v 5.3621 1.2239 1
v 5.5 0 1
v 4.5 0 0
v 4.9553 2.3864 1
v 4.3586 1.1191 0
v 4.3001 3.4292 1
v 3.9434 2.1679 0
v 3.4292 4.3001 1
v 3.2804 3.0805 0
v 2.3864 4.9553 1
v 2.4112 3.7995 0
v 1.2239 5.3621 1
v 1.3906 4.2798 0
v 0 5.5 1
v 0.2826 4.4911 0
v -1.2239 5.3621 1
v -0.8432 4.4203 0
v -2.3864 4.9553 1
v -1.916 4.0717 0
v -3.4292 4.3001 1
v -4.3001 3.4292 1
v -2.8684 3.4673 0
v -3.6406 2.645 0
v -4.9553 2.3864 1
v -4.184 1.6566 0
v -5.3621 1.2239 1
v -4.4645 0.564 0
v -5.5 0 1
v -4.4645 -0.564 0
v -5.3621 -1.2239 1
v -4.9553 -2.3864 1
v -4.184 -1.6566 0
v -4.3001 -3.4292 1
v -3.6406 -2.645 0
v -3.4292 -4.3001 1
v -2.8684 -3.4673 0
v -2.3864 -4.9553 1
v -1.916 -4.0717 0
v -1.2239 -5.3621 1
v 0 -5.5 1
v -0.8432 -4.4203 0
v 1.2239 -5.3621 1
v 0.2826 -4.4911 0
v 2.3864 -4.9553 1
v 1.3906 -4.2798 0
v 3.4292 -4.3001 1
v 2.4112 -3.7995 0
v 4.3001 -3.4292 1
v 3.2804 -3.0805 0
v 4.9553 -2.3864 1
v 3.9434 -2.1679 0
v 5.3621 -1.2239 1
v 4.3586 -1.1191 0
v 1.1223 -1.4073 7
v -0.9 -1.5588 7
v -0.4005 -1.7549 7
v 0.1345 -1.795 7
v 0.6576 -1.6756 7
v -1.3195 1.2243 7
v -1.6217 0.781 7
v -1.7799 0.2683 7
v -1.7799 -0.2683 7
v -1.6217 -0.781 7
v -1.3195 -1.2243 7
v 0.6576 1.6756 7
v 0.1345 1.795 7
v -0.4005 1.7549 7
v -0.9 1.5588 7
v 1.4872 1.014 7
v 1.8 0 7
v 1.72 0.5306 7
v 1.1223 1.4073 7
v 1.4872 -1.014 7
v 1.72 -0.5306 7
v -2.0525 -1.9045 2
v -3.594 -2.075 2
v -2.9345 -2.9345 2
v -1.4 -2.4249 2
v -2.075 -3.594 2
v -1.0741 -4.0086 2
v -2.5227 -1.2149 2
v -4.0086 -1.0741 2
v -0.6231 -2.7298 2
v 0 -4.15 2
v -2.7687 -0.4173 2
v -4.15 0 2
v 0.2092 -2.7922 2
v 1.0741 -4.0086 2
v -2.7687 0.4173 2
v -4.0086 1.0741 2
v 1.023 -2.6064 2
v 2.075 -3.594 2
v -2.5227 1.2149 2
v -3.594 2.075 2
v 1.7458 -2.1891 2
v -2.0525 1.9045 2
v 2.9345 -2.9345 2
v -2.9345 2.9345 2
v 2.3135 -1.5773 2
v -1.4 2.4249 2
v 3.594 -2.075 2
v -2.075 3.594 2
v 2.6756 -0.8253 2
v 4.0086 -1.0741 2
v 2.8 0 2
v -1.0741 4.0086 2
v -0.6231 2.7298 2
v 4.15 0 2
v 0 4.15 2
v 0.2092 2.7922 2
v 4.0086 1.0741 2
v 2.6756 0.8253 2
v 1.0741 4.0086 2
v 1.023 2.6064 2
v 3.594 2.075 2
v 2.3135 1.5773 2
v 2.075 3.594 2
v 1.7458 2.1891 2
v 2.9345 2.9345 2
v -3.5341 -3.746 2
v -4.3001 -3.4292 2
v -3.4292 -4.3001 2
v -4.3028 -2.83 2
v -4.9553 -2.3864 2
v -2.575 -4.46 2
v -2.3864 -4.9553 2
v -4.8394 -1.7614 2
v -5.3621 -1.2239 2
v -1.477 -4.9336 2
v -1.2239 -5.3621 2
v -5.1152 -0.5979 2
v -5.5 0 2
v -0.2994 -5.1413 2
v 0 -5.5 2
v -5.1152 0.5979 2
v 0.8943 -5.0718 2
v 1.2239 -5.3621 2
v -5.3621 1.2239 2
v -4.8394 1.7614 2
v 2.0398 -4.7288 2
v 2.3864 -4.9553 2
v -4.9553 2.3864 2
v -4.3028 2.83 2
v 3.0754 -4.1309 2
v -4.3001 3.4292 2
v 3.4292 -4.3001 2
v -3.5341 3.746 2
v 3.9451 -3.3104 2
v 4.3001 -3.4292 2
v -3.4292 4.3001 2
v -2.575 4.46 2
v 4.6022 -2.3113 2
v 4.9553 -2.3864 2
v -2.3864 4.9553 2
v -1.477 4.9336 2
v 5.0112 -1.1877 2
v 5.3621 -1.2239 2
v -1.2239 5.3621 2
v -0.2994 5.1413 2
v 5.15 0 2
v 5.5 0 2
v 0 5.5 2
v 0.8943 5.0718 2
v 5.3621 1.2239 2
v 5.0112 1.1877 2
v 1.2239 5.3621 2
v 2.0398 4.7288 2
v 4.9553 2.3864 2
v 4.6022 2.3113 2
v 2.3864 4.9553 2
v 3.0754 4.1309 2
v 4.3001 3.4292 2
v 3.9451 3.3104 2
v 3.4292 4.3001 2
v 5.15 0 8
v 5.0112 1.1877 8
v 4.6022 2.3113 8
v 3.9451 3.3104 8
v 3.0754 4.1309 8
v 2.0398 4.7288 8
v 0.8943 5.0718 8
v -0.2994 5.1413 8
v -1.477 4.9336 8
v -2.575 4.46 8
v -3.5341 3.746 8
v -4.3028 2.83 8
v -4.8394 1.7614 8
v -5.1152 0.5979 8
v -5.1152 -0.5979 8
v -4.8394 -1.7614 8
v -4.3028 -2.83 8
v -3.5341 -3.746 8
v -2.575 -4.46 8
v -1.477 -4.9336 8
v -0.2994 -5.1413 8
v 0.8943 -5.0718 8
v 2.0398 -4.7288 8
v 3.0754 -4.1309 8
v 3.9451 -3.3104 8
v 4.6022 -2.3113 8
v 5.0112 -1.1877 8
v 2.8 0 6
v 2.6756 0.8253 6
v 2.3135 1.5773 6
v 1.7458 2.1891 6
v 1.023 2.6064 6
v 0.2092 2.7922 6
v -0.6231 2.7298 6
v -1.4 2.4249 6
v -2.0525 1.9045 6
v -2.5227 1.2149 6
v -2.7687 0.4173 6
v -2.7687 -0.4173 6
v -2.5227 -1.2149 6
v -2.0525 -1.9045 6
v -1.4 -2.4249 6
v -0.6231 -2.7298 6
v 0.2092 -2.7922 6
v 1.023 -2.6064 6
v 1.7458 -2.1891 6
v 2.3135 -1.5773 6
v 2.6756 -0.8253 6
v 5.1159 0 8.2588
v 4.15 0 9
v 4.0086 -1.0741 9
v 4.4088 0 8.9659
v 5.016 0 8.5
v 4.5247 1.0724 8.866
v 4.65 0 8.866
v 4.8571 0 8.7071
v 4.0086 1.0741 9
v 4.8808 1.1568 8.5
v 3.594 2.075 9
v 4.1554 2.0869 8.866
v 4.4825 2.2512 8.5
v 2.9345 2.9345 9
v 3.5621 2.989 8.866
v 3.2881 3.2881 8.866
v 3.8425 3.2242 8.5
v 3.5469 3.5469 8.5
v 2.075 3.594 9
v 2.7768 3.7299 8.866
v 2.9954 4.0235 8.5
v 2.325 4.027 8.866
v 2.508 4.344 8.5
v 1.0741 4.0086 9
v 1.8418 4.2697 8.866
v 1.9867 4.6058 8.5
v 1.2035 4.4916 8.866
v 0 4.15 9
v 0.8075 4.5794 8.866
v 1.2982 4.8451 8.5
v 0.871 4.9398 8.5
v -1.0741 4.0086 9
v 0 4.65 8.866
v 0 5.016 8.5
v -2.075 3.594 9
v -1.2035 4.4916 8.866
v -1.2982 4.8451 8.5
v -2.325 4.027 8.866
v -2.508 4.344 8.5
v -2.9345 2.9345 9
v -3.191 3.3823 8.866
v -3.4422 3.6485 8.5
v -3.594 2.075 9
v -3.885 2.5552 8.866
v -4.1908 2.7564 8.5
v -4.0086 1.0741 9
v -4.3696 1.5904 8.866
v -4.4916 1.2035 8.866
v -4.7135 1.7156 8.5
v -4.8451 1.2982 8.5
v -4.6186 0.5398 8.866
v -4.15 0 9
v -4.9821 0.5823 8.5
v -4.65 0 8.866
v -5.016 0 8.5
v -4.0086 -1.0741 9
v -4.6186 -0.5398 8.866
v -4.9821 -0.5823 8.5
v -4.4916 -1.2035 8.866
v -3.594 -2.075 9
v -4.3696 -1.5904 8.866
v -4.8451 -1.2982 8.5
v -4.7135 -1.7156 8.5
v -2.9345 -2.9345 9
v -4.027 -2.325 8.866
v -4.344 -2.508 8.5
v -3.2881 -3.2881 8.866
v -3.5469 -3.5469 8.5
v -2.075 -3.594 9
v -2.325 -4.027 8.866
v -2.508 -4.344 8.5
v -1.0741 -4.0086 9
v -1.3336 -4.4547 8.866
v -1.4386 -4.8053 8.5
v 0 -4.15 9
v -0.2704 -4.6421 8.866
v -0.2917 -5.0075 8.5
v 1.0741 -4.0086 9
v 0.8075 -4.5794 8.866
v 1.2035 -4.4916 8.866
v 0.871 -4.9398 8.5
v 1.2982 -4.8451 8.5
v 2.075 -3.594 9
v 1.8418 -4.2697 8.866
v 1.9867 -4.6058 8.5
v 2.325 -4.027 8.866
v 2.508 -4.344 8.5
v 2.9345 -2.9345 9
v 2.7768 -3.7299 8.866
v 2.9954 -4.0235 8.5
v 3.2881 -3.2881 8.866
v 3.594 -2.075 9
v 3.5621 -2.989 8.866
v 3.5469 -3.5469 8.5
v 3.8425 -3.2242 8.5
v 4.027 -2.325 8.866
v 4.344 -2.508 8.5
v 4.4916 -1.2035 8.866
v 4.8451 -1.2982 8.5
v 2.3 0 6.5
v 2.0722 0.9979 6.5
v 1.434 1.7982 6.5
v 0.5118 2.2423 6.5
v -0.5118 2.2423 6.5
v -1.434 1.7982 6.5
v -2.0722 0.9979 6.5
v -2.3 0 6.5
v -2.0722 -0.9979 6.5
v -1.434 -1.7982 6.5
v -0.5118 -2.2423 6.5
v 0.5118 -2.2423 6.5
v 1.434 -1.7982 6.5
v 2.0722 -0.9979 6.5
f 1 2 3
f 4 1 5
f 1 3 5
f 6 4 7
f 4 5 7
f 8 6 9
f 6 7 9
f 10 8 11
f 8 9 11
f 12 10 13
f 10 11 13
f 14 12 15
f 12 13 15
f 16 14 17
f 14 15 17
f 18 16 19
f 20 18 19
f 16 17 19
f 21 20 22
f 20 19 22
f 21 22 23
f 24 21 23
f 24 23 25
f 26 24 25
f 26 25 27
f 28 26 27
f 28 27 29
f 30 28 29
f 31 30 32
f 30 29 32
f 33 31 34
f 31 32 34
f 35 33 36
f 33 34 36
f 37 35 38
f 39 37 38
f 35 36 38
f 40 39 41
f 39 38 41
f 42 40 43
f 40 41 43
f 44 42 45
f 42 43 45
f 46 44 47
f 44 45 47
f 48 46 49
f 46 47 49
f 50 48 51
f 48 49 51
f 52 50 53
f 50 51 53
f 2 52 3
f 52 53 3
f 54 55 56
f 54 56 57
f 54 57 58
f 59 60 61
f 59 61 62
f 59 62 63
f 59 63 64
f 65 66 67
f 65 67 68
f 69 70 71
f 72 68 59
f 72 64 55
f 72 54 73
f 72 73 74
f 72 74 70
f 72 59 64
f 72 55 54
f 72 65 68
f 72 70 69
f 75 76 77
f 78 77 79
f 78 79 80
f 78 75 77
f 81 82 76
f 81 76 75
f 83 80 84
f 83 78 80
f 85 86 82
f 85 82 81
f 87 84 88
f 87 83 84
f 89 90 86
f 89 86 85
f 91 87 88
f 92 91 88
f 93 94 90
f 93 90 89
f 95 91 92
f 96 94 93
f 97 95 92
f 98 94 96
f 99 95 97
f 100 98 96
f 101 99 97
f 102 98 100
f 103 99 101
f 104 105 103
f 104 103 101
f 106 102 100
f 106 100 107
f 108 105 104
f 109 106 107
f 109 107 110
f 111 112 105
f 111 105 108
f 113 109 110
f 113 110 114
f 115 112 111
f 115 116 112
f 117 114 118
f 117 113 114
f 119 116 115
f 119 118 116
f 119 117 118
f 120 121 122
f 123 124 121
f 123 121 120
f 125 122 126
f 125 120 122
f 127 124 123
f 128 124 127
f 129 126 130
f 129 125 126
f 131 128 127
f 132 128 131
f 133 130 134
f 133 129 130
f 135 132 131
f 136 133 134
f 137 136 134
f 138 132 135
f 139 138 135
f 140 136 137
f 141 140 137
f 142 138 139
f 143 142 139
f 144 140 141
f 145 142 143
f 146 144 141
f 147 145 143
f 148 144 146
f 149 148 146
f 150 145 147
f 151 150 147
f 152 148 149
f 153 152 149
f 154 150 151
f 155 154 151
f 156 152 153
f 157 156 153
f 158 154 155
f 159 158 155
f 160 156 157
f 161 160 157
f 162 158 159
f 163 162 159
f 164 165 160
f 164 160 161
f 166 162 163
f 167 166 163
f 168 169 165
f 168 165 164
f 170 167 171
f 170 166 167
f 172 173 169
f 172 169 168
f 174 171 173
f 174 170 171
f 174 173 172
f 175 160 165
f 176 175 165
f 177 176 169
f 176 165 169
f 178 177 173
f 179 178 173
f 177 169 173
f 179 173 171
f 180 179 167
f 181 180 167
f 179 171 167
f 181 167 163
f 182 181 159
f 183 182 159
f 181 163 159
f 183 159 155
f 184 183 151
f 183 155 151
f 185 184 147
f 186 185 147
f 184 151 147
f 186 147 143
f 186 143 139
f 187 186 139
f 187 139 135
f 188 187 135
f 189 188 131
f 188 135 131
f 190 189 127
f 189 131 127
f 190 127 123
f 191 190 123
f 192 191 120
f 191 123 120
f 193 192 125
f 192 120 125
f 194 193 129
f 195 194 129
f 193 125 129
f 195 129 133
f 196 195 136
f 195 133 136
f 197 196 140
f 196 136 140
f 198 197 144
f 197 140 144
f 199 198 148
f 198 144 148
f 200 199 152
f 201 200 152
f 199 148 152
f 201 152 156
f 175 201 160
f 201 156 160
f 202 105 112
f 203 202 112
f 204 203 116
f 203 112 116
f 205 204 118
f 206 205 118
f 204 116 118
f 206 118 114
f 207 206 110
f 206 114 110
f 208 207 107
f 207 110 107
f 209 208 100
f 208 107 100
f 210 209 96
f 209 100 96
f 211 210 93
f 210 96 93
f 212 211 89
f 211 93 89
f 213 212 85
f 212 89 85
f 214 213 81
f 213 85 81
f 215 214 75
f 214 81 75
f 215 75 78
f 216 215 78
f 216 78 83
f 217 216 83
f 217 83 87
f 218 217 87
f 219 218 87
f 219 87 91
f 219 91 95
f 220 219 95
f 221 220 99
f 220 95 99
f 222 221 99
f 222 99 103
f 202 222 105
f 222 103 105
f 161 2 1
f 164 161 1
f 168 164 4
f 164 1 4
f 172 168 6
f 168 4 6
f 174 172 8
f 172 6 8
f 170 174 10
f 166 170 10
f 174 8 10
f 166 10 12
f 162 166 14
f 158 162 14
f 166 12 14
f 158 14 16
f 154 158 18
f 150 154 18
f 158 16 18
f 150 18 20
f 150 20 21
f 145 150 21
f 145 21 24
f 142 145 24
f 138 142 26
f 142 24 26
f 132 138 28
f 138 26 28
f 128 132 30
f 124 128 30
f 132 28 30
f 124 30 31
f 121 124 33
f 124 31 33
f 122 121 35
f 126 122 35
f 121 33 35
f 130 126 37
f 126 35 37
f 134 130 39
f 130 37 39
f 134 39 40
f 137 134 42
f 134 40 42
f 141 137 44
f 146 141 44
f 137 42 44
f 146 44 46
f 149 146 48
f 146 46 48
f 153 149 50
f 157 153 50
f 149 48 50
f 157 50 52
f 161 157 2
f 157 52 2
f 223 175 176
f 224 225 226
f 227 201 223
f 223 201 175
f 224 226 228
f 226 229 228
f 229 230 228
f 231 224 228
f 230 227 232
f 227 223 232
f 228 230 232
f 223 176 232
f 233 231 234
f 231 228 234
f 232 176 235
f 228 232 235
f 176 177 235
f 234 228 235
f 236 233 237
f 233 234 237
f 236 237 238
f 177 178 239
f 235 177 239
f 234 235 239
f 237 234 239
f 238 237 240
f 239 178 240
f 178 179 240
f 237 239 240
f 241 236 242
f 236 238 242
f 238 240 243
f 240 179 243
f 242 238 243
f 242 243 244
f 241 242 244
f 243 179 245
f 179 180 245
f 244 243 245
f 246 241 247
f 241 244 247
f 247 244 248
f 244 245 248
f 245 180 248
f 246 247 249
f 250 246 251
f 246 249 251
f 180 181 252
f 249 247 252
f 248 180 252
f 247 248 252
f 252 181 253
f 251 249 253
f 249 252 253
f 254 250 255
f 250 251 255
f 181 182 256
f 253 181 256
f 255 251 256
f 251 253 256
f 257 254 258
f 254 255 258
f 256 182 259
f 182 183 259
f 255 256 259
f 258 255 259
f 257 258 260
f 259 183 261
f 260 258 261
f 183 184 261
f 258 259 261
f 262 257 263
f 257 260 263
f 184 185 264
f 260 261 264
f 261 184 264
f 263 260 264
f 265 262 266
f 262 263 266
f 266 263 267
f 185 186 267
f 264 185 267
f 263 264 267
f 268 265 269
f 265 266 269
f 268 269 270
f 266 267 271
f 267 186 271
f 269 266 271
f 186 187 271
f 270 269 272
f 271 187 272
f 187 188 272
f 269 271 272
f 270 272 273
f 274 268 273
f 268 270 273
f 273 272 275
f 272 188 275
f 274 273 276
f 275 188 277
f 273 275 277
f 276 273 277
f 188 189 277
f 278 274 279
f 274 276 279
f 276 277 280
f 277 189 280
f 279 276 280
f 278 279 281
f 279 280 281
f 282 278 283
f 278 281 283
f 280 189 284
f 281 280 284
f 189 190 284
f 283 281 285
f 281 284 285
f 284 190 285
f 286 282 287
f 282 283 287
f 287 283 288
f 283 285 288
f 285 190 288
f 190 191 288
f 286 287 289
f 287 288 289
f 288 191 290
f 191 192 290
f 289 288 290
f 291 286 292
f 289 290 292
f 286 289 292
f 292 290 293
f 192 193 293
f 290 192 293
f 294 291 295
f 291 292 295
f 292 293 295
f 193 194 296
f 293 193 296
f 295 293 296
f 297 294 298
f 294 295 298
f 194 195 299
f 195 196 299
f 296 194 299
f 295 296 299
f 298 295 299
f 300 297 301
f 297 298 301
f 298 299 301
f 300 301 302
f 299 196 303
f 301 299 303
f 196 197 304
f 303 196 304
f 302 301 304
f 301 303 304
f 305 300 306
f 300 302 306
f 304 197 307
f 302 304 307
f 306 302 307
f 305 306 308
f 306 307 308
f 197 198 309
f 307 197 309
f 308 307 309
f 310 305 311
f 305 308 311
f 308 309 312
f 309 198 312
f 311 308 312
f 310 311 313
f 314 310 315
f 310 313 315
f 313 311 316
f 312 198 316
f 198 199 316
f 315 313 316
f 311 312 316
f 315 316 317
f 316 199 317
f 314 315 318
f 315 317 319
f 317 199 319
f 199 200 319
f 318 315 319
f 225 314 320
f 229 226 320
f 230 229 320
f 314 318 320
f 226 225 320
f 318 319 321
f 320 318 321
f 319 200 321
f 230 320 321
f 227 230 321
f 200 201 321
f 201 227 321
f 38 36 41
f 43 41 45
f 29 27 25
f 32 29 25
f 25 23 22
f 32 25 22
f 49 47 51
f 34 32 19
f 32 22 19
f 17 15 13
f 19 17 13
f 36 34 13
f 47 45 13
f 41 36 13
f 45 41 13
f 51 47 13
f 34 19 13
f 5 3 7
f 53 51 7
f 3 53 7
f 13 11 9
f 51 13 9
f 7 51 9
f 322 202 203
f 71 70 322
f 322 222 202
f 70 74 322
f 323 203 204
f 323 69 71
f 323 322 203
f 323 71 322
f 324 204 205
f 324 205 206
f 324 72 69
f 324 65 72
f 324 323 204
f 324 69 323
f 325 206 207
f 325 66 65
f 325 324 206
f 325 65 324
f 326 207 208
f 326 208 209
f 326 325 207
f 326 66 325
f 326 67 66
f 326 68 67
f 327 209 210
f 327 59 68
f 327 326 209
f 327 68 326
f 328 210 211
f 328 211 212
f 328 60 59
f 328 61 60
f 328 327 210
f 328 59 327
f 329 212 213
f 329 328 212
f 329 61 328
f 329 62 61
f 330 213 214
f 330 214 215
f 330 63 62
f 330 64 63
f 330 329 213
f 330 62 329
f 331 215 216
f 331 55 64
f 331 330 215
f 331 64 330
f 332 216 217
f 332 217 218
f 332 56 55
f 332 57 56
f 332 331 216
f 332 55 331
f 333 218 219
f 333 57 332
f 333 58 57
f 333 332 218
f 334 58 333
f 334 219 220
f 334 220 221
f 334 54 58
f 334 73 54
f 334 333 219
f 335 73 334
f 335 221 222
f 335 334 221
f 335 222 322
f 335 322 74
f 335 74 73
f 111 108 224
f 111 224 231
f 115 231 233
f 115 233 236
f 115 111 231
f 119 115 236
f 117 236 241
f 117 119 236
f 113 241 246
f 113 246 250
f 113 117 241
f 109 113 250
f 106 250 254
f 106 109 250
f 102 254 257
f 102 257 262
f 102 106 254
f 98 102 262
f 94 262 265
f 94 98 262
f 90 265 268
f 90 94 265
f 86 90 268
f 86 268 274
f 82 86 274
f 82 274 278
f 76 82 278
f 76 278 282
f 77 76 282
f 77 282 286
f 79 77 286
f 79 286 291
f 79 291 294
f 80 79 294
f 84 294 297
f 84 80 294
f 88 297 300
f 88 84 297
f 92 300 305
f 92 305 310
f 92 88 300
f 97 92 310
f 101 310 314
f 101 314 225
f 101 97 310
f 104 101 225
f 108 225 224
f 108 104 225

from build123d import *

# Parameters (mm, degrees)
F0_R     = 5.5
F1_DEPTH = 2
F2_R     = 2.8
F3_DEPTH = 5
F2_R_2   = 5.15
F2_R_3   = 4.15
F4_DEPTH = 7
F5_SIZE2 = 1
F5_SIZE  = 1
F6_R     = 0.99999
F7_SIZE  = 1


# Not quite as in the source:
# - a fillet or chamfer is up to 0.001 mm smaller than in the source, because OpenCascade refuses the exact size


with BuildPart() as f1:
    # F0 (on Top) → F1 (new body)
    with BuildSketch(Plane.XY):
        Circle(F0_R)
    extrude(amount=F1_DEPTH)

    # F2 (on face) → F3 (join)
    with BuildSketch(Plane.XY.offset(2)):
        Circle(F2_R)
    extrude(amount=F3_DEPTH)

    # F2 (on face) → F4 (join)
    with BuildSketch(Plane.XY.offset(2)):
        Circle(F2_R_2)
        Circle(F2_R_3, mode=Mode.SUBTRACT)
    extrude(amount=F4_DEPTH)

    # F5
    f5_edges = [f1.edges().sort_by_distance(p)[0] for p in [
        (-2.8, 0, 7),
    ]]
    chamfer(f5_edges, length=F5_SIZE, length2=F5_SIZE2)

    # F6 (radius 1 in the source; OpenCascade refuses exactly that, so slightly less here)
    f6_edges = [f1.edges().sort_by_distance(p)[0] for p in [
        (-5.15, 0, 9),
    ]]
    fillet(f6_edges, radius=F6_R)

    # F7
    f7_edges = [f1.edges().sort_by_distance(p)[0] for p in [
        (-5.5, 0, 0),
    ]]
    chamfer(f7_edges, length=F7_SIZE)


solid = f1.part
